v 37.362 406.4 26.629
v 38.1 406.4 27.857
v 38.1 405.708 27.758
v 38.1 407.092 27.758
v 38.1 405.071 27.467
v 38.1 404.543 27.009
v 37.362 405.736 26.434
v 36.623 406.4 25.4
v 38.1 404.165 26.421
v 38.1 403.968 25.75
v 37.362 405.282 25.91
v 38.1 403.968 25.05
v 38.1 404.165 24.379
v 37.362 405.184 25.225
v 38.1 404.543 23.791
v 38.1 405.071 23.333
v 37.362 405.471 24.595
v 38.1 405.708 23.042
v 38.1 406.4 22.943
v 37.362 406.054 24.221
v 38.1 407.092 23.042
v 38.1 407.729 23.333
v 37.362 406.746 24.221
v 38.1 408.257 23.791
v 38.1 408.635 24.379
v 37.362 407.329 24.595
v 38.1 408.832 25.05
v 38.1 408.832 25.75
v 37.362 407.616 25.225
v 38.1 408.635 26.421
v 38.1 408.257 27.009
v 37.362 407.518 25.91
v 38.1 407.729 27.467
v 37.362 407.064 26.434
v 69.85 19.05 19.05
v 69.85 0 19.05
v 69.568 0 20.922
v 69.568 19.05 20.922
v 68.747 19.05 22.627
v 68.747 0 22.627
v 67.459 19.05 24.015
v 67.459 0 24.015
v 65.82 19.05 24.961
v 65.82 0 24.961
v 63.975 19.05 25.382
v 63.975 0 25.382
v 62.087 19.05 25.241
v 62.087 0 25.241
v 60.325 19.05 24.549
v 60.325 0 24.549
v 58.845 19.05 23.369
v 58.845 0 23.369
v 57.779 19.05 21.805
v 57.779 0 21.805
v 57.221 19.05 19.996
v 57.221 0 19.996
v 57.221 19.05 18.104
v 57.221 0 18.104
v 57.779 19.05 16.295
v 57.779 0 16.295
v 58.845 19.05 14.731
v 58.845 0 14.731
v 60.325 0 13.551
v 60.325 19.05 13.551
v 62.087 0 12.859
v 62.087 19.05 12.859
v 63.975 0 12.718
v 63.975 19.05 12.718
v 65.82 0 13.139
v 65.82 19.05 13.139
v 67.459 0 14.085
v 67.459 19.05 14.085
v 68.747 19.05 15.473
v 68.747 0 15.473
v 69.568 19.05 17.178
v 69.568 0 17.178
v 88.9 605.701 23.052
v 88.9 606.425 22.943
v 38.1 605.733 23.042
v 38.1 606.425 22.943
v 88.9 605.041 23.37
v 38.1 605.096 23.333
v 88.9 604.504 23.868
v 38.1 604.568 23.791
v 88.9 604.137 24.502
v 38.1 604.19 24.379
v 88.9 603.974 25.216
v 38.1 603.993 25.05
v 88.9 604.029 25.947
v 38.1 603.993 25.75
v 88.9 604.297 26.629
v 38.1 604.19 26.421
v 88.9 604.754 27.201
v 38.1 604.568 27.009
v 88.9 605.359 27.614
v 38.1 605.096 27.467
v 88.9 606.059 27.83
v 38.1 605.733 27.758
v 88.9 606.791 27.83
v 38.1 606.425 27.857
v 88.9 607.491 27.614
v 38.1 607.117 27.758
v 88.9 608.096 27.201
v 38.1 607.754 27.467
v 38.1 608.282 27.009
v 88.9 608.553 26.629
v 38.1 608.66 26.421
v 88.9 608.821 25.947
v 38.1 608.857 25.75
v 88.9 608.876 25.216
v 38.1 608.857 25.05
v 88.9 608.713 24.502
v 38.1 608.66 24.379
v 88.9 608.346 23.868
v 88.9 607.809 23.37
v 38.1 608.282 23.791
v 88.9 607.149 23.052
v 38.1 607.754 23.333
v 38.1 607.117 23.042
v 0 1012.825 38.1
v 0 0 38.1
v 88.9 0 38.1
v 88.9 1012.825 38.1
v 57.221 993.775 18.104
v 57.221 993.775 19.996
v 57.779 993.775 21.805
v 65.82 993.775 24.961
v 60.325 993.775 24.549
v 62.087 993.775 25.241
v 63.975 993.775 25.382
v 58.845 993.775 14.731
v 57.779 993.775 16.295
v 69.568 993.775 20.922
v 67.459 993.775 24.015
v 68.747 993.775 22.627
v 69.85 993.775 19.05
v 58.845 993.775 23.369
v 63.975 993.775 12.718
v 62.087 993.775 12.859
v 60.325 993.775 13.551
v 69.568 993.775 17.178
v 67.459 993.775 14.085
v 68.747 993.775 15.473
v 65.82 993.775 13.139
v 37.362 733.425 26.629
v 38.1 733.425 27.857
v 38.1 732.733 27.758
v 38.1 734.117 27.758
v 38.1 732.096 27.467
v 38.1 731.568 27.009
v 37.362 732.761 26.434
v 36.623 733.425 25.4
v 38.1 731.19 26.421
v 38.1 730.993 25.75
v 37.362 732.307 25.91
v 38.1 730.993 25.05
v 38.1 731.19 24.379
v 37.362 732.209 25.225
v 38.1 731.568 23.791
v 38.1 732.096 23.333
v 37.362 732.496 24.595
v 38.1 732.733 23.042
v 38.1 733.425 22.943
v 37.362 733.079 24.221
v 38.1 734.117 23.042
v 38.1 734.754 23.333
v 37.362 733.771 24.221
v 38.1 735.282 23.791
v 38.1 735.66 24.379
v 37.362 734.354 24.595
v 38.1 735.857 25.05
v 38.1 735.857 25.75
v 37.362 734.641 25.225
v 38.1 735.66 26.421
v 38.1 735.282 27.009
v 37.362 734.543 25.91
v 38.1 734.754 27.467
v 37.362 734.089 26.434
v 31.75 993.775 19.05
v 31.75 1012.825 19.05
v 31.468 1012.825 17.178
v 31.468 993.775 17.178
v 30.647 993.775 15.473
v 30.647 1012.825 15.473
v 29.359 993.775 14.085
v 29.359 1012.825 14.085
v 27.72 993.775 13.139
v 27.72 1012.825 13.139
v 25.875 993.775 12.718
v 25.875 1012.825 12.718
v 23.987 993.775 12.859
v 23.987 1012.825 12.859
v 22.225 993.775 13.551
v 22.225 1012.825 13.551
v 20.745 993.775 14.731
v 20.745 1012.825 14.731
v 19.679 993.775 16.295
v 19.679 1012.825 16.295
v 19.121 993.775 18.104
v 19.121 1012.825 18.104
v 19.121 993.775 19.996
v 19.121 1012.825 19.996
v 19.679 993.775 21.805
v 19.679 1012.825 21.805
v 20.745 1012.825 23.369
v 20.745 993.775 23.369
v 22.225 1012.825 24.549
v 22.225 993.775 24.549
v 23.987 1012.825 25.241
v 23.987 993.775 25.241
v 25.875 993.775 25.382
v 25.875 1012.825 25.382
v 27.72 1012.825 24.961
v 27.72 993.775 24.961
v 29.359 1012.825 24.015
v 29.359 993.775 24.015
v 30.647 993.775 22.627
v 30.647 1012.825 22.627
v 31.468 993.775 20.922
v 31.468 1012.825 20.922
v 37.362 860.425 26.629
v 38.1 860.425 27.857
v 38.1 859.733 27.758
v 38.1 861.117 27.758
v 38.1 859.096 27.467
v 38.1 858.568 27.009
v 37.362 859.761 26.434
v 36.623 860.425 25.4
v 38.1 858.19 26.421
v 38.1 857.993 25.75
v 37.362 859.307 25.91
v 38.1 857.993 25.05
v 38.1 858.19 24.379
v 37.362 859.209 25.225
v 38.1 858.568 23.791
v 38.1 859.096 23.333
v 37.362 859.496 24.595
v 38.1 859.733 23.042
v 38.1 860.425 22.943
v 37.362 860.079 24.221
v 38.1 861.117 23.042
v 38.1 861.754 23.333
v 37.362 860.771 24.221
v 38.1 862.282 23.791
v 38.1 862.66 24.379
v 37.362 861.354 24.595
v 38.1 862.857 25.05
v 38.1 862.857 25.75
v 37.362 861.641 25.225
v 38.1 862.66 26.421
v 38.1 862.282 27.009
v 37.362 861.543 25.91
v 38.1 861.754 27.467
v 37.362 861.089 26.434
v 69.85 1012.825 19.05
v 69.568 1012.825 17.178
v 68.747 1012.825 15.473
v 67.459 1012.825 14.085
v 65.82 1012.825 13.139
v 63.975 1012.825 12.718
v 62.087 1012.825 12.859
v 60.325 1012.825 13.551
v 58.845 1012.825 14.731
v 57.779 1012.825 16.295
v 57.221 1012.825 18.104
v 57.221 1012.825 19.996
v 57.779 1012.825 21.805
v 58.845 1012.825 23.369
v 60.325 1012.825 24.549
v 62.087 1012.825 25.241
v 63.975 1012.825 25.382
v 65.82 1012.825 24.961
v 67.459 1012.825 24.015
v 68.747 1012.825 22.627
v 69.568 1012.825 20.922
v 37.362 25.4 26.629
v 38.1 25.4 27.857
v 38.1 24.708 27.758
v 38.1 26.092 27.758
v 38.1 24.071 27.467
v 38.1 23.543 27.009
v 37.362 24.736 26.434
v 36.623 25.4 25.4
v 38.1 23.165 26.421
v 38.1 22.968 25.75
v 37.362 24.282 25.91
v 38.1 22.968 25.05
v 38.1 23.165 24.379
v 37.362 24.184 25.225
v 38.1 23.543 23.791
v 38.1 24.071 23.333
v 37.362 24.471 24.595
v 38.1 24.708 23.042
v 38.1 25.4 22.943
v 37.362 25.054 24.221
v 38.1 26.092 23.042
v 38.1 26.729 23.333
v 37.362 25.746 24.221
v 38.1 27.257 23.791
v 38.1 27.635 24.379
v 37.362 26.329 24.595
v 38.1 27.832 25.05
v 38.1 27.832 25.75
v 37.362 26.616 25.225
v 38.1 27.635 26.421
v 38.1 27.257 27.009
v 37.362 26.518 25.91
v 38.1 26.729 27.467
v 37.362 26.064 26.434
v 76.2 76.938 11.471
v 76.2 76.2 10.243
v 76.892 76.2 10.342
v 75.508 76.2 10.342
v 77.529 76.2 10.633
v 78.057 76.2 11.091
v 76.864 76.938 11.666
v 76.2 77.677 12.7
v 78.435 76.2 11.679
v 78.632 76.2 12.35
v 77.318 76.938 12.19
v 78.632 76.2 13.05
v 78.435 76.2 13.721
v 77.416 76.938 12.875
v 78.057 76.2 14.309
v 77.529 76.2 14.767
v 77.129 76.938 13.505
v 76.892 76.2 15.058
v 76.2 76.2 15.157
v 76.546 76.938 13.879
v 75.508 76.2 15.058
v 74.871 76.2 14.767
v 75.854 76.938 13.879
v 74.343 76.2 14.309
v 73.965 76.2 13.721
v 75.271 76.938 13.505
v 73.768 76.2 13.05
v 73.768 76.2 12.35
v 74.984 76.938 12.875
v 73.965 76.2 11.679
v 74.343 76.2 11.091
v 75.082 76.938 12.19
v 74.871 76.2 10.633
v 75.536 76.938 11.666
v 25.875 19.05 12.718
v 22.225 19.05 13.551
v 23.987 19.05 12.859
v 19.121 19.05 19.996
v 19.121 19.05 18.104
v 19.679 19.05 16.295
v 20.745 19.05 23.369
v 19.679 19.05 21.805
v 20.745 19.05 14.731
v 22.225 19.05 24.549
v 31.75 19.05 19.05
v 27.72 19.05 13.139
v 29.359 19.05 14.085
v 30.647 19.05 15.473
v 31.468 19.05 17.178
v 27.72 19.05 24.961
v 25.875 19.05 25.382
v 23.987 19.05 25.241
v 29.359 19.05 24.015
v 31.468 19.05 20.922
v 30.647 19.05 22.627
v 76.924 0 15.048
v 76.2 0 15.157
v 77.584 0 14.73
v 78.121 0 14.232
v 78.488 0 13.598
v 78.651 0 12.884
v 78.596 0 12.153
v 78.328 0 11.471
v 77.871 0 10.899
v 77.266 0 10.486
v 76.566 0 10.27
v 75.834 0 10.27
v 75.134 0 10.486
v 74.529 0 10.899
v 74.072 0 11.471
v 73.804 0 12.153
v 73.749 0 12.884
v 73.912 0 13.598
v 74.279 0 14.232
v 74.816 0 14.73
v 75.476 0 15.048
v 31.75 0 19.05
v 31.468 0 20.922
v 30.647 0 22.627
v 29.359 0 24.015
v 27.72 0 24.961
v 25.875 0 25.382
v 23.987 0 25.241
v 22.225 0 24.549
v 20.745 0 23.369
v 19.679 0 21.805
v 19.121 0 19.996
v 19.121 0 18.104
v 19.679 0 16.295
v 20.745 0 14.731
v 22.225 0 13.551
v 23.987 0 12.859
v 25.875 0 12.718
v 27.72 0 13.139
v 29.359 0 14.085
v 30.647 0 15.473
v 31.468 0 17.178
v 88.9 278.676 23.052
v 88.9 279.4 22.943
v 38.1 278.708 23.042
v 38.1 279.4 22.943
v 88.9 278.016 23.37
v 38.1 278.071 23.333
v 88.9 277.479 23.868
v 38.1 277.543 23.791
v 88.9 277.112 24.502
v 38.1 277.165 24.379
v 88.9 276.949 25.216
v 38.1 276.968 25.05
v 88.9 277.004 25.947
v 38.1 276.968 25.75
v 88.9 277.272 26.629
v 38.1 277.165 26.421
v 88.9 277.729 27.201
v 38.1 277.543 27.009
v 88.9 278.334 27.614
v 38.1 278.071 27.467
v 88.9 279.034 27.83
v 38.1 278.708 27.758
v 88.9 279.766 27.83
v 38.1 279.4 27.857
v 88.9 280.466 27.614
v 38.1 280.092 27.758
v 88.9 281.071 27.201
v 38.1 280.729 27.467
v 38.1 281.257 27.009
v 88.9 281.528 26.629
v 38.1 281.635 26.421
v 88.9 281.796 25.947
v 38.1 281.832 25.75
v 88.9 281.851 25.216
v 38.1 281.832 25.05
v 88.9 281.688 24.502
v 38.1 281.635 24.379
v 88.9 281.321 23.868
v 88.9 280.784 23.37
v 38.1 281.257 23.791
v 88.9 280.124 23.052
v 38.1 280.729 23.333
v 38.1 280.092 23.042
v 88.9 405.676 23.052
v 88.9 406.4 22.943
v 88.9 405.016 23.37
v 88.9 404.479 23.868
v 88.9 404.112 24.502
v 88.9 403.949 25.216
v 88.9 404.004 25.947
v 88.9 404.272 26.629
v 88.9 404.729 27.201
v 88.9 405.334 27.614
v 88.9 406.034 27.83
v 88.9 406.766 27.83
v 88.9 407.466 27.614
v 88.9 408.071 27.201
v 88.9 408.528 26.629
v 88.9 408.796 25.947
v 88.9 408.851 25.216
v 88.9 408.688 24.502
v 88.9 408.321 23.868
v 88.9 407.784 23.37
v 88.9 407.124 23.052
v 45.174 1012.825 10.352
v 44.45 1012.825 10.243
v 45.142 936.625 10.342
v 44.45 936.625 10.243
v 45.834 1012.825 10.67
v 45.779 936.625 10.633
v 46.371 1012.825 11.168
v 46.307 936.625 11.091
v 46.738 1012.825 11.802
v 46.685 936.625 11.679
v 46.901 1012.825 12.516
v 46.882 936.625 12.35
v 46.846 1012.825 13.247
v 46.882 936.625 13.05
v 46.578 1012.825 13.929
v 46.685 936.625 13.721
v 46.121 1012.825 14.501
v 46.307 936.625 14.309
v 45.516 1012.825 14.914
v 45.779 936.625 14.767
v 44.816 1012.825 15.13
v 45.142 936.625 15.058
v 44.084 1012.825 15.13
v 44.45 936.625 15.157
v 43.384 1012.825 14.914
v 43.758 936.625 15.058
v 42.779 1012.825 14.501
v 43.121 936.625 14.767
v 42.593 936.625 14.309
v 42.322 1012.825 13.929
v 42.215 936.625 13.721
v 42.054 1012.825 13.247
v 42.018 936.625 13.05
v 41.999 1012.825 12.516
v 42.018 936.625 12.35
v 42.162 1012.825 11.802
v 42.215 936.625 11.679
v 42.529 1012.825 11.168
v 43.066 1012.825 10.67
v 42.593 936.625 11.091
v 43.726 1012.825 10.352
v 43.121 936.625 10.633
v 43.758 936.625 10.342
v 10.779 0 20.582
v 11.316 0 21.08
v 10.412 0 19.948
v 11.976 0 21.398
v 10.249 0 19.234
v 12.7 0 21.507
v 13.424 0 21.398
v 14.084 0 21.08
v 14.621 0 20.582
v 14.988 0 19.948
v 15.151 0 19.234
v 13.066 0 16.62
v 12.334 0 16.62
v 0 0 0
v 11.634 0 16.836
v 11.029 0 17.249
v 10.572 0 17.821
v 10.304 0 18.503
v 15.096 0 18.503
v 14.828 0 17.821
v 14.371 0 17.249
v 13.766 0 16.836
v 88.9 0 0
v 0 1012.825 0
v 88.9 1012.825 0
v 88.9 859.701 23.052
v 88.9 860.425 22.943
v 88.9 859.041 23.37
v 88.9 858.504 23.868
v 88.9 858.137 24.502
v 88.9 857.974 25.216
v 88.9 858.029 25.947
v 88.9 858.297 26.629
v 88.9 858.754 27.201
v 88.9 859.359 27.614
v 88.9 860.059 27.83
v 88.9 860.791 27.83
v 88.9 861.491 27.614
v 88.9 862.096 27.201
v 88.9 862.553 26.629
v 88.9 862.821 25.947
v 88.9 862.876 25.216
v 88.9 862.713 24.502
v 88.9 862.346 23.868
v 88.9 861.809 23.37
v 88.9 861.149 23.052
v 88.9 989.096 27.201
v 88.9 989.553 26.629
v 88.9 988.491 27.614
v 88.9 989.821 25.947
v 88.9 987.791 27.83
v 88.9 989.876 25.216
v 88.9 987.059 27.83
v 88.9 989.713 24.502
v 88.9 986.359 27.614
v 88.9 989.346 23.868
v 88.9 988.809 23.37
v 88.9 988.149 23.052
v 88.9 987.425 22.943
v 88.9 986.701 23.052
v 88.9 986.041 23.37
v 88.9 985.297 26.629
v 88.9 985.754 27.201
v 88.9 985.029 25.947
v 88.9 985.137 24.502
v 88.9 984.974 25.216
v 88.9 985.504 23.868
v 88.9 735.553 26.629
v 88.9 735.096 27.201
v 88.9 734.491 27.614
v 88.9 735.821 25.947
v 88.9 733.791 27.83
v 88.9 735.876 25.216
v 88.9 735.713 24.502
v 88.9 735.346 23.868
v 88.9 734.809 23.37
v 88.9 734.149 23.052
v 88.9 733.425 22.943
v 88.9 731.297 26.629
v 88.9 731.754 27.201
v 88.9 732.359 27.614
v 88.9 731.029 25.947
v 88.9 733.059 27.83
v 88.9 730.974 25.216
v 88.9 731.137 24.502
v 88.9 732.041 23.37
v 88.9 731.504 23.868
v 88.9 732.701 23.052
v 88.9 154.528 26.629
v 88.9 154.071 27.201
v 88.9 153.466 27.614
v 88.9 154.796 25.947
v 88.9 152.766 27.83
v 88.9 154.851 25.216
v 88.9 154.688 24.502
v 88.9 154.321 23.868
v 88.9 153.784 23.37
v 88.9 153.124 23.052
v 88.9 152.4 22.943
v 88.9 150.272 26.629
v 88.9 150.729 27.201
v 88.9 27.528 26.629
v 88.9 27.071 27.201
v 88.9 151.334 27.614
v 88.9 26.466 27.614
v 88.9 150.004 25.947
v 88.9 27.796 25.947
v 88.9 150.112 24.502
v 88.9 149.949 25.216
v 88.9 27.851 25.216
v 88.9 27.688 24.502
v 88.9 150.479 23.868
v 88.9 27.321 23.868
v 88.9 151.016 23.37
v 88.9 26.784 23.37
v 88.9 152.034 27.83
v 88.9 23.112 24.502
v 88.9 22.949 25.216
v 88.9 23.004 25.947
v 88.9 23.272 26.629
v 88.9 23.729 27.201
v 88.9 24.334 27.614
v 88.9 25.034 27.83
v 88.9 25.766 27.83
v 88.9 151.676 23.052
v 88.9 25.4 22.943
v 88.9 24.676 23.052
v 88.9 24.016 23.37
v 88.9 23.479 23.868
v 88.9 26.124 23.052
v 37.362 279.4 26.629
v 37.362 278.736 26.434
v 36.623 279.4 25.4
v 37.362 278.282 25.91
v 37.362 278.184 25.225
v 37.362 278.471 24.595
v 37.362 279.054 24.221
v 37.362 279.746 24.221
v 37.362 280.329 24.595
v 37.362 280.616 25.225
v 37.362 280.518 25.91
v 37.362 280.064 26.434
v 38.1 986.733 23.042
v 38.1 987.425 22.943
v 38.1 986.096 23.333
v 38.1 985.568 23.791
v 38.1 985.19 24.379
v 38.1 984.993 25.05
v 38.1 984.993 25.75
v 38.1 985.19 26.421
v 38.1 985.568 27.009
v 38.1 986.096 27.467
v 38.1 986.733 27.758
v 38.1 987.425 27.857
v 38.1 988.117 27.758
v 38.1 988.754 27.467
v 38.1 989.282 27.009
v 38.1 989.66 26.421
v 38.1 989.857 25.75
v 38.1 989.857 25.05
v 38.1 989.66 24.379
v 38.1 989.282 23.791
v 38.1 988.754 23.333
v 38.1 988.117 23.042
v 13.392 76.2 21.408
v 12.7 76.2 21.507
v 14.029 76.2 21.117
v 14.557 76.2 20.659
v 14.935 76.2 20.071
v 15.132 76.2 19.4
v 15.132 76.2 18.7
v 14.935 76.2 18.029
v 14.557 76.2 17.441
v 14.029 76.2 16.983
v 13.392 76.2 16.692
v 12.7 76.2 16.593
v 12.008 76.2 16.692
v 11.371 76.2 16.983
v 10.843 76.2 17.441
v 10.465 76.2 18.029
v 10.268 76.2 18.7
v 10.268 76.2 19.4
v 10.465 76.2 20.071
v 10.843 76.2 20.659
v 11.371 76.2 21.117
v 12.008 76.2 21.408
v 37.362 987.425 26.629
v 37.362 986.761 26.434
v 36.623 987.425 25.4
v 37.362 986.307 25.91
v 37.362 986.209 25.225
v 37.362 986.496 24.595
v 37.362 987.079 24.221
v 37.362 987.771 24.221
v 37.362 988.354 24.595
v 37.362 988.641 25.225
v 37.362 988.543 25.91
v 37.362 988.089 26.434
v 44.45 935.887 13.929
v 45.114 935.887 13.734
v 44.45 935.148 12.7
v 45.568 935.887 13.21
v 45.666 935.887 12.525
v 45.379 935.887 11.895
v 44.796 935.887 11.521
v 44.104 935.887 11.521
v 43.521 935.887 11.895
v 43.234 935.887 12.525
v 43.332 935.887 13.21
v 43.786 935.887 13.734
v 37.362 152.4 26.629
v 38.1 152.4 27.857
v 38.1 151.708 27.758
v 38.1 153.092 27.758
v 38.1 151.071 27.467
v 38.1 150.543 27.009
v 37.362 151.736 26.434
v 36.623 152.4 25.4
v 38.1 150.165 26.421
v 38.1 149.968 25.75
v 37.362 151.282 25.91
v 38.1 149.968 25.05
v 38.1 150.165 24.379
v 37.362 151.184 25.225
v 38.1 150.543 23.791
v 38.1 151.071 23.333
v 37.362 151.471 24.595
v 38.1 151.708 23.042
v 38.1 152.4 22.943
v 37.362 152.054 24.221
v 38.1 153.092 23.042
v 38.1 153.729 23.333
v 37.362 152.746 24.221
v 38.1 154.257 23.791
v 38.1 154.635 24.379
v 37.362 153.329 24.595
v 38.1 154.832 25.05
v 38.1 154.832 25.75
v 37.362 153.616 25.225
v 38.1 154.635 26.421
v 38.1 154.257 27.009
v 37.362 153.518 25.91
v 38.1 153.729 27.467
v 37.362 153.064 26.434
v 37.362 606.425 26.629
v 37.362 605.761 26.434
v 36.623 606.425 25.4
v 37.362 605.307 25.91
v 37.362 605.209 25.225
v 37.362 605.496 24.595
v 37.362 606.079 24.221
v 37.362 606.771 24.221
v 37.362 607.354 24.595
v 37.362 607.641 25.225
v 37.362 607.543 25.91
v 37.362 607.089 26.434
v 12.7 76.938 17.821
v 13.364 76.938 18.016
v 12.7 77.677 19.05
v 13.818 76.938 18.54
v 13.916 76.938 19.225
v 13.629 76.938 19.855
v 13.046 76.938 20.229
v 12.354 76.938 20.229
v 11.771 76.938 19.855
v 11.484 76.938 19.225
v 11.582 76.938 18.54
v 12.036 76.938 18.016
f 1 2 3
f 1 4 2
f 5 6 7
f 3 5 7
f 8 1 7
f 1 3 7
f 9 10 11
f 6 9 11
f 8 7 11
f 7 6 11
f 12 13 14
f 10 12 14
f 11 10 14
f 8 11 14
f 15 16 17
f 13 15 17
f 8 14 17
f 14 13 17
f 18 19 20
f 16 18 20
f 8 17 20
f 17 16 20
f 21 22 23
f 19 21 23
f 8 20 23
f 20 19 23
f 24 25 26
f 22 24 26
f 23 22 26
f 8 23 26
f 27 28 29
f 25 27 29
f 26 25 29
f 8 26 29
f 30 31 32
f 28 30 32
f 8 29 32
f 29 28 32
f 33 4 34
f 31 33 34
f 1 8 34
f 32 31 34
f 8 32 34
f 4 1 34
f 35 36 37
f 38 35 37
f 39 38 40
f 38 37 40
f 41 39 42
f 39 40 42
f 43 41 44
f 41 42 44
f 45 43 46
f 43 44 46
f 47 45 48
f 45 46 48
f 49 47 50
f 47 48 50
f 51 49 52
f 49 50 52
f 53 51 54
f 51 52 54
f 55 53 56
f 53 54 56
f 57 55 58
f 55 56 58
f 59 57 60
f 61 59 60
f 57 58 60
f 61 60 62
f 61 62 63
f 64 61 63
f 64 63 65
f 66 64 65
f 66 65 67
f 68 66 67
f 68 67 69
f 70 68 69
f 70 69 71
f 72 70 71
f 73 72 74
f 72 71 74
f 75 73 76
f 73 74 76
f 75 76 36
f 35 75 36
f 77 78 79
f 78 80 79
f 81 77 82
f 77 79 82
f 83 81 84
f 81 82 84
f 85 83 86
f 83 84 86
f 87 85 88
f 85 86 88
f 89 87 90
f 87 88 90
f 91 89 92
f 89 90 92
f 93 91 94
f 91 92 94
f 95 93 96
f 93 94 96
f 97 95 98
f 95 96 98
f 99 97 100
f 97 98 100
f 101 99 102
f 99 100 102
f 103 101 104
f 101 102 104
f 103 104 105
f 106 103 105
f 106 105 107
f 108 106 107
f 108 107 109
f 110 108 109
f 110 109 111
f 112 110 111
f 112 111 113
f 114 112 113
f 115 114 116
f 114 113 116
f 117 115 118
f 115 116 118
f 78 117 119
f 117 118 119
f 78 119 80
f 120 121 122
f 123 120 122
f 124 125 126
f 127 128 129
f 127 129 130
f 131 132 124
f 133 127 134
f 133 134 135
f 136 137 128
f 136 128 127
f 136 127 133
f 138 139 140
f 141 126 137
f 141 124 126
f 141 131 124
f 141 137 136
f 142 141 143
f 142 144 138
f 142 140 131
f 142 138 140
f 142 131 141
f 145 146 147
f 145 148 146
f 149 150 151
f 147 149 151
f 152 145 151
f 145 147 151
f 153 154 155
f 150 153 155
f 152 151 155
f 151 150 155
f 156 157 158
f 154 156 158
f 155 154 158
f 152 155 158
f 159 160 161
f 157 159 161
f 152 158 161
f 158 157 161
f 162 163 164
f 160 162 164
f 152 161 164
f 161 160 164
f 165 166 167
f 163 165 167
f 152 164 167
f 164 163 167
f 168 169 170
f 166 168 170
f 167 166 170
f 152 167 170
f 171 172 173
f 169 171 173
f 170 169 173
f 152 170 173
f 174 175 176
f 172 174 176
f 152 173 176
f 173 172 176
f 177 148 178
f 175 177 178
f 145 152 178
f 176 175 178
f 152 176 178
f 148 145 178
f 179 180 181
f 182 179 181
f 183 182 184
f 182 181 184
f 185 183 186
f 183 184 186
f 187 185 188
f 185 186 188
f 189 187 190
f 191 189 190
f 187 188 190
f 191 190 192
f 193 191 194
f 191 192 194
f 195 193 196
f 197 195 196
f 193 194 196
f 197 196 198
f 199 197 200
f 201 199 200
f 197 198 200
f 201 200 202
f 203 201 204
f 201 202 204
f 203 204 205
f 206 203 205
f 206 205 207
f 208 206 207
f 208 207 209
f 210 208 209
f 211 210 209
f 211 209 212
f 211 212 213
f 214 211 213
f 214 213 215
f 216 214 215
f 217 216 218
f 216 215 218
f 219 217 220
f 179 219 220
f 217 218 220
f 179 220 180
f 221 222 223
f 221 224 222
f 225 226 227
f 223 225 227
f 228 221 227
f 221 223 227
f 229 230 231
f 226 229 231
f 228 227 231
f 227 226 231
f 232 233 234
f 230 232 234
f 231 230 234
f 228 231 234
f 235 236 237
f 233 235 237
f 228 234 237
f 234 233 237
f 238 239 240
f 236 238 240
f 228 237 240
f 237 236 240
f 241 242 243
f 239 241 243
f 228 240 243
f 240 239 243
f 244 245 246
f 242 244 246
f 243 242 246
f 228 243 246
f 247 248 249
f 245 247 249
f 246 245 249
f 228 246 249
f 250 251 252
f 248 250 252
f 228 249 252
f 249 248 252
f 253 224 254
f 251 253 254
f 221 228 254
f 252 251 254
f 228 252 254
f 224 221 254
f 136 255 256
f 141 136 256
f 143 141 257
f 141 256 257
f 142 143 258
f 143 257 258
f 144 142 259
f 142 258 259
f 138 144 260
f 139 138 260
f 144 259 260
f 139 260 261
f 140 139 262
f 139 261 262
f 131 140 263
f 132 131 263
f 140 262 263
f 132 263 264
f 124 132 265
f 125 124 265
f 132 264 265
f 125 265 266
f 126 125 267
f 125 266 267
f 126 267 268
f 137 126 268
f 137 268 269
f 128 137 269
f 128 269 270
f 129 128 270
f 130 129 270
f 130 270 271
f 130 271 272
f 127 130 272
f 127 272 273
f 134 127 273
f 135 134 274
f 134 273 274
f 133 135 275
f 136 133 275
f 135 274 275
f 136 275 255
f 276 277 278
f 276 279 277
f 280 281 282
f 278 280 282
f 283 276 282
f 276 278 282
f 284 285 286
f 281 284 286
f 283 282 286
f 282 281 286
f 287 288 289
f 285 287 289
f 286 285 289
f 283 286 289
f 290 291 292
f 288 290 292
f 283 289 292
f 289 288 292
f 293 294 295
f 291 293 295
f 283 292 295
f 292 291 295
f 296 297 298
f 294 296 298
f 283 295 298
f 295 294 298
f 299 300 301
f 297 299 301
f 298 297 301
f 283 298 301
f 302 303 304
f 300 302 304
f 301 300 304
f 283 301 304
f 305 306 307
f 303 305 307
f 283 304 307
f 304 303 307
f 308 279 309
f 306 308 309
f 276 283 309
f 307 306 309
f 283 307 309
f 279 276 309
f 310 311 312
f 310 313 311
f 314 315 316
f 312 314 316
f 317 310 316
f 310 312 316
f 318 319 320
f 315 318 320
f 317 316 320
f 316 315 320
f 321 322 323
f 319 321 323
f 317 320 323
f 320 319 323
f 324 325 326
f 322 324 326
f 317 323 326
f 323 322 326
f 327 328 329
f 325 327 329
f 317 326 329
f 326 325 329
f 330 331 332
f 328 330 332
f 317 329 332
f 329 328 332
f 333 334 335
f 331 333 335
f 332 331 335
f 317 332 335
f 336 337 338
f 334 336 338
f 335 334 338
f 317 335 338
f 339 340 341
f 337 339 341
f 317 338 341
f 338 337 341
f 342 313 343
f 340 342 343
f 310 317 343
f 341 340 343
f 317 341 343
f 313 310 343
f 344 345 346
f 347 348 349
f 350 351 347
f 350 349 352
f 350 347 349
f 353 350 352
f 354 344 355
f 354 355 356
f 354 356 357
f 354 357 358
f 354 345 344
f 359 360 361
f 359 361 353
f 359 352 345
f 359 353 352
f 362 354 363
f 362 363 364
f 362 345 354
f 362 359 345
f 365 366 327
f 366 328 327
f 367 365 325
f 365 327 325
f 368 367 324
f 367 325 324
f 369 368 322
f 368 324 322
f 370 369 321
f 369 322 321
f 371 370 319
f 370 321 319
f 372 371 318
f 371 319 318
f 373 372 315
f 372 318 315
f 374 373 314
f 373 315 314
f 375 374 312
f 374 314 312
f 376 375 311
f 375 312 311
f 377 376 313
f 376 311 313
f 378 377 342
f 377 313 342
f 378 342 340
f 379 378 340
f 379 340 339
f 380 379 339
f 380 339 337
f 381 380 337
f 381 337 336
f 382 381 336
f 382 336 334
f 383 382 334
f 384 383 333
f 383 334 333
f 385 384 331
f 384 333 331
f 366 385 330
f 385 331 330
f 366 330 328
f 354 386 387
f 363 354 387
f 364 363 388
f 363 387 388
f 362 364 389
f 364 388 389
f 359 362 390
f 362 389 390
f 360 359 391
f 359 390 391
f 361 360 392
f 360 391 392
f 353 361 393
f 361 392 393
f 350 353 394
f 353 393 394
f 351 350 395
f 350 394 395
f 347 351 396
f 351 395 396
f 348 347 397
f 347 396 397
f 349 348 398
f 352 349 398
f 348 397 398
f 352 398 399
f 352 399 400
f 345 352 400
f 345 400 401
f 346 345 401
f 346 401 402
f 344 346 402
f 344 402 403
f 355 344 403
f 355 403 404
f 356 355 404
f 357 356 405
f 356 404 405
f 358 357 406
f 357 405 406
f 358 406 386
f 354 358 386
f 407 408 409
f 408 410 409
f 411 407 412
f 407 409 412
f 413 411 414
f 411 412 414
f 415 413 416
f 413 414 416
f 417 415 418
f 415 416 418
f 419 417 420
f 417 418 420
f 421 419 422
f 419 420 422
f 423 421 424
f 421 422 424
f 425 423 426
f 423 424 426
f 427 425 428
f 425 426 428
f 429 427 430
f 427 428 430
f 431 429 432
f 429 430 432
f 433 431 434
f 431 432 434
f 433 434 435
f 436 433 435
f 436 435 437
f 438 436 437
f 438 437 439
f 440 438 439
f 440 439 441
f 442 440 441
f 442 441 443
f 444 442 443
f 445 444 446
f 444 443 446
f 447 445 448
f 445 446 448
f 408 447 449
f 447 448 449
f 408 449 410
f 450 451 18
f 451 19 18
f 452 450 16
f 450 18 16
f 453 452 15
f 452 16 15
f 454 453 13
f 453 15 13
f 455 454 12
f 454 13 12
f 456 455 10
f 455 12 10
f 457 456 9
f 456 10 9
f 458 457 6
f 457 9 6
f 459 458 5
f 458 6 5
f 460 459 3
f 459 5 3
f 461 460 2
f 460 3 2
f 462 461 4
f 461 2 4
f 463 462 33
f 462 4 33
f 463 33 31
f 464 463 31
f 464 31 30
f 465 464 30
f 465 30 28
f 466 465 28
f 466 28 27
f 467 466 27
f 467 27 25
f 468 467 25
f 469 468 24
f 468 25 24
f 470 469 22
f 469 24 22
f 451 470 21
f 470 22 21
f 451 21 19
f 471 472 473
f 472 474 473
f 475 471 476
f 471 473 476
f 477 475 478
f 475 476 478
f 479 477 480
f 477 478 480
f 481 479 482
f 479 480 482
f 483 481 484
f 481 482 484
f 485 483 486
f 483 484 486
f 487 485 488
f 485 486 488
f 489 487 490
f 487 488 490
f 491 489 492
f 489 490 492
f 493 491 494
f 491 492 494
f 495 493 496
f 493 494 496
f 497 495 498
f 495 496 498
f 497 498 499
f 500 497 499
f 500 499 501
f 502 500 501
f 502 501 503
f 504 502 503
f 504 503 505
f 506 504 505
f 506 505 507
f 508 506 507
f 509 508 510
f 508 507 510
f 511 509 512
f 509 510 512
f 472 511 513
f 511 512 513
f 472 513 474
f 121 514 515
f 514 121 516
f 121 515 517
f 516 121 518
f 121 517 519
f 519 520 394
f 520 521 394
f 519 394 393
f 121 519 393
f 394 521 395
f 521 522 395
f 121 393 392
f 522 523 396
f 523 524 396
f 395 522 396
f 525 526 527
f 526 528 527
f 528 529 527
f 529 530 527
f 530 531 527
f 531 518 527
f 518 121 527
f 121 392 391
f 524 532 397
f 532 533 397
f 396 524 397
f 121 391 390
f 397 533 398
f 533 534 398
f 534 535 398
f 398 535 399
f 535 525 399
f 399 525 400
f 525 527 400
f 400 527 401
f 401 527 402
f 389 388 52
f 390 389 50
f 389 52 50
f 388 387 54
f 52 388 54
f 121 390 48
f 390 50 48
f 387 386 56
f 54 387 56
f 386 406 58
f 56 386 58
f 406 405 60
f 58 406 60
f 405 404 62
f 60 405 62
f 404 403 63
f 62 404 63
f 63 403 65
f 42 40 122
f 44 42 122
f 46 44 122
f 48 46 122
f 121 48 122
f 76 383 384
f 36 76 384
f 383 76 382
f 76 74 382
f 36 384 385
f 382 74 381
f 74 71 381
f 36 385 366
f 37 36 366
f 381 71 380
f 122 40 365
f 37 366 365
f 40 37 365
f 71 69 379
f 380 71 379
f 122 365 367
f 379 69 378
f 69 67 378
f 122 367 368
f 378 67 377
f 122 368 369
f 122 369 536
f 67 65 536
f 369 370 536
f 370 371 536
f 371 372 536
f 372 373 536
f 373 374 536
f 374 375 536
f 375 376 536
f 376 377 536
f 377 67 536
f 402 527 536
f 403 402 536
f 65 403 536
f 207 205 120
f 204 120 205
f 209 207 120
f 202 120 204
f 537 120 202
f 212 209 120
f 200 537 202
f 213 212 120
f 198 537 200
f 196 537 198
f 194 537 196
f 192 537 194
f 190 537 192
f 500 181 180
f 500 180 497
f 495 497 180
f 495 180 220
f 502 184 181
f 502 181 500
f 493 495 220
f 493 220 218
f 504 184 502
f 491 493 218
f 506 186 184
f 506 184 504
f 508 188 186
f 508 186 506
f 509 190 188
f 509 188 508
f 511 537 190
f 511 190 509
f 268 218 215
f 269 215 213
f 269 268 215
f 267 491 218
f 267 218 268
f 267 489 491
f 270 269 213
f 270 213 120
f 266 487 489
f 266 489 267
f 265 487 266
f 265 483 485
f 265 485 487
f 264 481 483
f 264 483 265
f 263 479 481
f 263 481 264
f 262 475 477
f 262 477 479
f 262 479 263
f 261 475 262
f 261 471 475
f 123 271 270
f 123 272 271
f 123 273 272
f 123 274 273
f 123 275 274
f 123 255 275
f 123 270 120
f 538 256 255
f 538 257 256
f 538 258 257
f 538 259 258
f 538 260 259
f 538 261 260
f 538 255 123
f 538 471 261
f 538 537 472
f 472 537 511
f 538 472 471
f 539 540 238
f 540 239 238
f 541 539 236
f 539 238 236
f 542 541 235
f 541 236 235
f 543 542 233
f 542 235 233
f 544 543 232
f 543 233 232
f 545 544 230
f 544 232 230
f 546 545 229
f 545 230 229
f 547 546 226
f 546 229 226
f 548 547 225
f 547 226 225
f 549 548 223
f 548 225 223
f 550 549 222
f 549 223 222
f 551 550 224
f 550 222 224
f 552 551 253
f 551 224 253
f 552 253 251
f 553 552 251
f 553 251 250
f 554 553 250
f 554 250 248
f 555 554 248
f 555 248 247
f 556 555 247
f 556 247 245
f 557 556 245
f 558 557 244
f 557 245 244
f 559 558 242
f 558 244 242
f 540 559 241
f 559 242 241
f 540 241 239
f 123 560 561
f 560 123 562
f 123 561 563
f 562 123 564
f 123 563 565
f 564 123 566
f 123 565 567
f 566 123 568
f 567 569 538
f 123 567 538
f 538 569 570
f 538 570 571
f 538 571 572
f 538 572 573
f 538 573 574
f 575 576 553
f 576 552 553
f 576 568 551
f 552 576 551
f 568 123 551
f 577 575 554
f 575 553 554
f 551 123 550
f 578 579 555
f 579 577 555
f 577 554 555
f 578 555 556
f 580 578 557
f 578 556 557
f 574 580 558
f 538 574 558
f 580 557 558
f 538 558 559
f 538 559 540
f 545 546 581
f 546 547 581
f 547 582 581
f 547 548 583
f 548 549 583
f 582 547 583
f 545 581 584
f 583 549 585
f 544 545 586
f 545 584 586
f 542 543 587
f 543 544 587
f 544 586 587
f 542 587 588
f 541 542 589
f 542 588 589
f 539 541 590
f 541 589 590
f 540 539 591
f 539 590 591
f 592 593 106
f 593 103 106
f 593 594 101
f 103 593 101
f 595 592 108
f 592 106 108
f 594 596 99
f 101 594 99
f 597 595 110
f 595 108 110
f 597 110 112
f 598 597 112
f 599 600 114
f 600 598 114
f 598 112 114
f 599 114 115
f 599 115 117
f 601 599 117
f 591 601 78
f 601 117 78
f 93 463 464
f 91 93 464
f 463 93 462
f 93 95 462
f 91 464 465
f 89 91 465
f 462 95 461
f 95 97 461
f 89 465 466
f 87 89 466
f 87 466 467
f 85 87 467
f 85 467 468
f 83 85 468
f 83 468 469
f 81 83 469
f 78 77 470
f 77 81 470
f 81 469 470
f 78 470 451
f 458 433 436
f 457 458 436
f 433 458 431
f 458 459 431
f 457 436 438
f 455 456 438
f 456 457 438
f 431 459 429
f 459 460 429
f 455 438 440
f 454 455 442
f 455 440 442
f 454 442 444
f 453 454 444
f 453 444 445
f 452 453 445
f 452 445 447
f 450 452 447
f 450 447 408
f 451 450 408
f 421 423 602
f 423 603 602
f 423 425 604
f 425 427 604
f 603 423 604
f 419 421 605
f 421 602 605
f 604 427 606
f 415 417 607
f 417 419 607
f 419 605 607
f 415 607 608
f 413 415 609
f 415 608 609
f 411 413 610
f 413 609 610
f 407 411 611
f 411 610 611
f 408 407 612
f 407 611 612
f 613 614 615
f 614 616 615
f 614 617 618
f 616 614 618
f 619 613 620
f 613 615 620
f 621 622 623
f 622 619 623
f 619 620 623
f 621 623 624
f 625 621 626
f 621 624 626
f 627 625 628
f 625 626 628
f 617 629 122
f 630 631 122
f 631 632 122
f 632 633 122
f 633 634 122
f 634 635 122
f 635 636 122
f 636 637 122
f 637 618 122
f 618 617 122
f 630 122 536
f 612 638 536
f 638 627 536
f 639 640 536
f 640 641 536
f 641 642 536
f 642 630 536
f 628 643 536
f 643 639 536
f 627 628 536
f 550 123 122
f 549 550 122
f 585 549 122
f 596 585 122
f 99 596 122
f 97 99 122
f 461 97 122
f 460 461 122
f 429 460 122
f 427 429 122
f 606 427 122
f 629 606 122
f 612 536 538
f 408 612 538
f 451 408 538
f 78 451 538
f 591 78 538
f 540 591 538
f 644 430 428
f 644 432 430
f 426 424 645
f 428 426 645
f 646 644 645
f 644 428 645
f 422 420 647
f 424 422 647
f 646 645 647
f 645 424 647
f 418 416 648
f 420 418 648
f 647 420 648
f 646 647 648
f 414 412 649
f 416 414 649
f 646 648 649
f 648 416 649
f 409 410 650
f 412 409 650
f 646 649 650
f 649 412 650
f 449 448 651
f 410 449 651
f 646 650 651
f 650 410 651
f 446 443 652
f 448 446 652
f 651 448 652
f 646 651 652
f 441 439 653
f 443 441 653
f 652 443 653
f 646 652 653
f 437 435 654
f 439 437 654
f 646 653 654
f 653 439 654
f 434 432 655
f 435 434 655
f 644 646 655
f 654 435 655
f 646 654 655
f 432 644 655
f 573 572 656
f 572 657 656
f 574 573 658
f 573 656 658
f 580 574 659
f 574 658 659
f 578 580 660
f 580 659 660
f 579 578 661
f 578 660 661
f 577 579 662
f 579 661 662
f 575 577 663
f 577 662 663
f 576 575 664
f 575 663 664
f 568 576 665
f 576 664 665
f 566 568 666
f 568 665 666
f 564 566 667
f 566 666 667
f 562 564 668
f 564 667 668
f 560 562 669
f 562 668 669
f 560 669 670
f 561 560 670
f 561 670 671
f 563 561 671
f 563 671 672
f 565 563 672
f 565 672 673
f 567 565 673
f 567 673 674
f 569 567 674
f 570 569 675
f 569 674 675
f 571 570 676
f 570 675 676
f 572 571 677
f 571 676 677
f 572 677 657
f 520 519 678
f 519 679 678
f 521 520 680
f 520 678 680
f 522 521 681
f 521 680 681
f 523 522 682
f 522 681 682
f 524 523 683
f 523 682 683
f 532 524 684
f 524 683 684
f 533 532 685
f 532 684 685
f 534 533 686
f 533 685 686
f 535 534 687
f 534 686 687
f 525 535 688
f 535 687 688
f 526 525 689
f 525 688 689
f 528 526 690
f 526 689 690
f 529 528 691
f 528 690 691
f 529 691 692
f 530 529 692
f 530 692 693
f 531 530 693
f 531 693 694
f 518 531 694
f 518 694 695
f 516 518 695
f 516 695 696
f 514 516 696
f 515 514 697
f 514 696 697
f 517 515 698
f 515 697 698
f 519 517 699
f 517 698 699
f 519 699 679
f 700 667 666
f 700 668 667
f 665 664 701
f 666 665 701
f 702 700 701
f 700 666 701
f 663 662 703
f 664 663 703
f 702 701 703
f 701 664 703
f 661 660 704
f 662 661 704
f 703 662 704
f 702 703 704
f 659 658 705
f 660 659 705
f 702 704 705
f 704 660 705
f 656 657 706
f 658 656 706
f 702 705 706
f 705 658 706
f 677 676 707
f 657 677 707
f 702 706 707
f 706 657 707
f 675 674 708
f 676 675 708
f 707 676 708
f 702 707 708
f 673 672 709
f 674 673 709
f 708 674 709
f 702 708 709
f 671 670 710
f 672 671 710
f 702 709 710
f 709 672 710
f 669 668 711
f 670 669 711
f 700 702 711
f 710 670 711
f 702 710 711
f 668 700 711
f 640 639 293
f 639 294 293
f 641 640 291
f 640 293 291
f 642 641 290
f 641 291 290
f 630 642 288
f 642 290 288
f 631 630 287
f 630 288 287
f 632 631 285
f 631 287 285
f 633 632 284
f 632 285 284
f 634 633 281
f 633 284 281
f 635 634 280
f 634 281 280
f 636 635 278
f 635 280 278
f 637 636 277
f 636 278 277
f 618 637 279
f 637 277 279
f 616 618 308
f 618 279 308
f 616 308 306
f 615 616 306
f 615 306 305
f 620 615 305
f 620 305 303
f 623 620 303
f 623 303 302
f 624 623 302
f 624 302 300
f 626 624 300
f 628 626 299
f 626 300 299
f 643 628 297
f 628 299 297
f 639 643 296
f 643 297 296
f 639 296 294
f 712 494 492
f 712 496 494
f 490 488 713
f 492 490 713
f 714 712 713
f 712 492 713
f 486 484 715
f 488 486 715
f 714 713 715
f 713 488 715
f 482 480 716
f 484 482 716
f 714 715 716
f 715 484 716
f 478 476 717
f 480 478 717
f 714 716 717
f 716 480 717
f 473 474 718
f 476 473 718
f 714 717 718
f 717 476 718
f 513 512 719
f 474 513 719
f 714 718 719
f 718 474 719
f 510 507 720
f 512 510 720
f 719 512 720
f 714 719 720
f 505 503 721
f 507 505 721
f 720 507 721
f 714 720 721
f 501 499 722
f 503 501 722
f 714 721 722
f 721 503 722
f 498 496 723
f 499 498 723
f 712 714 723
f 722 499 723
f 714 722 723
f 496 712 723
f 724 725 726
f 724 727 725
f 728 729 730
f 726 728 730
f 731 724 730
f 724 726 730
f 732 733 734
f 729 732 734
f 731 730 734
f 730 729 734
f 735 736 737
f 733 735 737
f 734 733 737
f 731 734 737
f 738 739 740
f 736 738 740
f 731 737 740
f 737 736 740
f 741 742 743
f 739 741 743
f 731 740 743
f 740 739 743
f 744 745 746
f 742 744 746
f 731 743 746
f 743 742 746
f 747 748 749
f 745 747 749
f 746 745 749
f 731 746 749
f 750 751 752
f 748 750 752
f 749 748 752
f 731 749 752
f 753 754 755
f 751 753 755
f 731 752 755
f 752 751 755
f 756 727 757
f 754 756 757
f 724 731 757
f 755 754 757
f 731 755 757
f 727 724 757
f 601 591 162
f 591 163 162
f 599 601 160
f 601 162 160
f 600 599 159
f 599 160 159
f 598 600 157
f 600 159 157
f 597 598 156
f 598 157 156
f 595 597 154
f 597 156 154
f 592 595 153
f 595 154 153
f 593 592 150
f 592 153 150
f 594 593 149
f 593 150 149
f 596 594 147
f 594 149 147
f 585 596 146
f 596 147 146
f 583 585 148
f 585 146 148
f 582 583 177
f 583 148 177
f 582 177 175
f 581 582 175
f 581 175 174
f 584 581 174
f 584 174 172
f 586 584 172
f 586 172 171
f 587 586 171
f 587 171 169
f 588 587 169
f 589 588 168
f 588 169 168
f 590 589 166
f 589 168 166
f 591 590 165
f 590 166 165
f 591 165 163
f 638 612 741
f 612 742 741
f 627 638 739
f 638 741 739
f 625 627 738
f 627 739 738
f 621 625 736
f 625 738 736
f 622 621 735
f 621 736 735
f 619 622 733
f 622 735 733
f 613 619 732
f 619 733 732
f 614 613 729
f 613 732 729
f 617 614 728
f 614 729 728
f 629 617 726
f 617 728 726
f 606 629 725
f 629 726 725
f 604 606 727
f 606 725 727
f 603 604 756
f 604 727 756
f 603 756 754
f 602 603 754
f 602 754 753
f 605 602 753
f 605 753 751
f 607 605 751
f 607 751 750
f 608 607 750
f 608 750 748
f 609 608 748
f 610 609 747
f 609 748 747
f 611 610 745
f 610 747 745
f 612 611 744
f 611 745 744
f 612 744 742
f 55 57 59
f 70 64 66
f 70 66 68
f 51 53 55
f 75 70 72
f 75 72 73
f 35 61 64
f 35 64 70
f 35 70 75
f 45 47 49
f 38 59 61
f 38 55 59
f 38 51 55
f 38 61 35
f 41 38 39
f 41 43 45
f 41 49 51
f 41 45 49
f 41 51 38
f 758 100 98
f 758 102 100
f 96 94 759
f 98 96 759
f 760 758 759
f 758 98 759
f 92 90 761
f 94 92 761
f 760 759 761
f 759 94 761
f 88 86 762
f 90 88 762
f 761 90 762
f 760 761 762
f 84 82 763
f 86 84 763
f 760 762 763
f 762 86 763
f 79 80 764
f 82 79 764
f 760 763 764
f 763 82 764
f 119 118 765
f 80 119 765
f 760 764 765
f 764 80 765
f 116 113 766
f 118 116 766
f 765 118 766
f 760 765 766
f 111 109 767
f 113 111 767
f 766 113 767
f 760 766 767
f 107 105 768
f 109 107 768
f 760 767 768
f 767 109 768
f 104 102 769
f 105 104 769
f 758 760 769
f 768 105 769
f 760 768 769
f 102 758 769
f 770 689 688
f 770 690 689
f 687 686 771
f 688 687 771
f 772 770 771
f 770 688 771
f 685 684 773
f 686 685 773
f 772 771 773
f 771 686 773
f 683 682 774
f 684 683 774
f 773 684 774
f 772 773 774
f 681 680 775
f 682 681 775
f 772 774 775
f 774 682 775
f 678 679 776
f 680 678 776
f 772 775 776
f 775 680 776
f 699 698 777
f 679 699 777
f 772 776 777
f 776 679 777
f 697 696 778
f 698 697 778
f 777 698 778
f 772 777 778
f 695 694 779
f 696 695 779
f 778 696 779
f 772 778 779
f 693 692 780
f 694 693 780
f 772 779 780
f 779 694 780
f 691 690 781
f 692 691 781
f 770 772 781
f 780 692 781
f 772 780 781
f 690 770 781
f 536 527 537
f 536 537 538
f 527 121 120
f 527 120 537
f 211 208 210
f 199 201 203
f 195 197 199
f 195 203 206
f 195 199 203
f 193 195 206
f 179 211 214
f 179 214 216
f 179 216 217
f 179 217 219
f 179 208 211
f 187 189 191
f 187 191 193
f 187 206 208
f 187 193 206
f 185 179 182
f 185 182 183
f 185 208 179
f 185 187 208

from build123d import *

# Parameters (mm, degrees)
SKETCH1_W                                  = 88.9
SKETCH1_H                                  = 38.1
BOSS_EXTRUDE1_DEPTH                        = 1012.825
SKETCH2_R                                  = 6.35
CUT_EXTRUDE1_DEPTH                         = 19.05
SKETCH3_R                                  = 6.35
CUT_EXTRUDE2_DEPTH                         = 19.05
F_10_0_1935_DIAMETER_HOLE1_D               = 4.9149
F_10_0_1935_DIAMETER_HOLE1_DEPTH           = 76.2
F_10_0_1935_DIAMETER_HOLE1_TIP             = 1.476584928
F_10_0_1935_DIAMETER_HOLE1_ON_FACE_2_D     = 4.9149
F_10_0_1935_DIAMETER_HOLE1_ON_FACE_2_DEPTH = 76.2
F_10_0_1935_DIAMETER_HOLE1_ON_FACE_2_TIP   = 1.476584928
F_10_0_1935_DIAMETER_HOLE2_D               = 4.9149
F_10_0_1935_DIAMETER_HOLE2_DEPTH           = 50.8
F_10_0_1935_DIAMETER_HOLE2_TIP             = 1.476584928


with BuildPart() as part:
    # Sketch1 → Boss-Extrude1 (new body)
    with BuildSketch(Plane(origin=(0, 0, 0), x_dir=(1, 0, 0), z_dir=(0, 1, 0))):
        with Locations((44.45, -19.05)):
            Rectangle(SKETCH1_W, SKETCH1_H)
    extrude(amount=BOSS_EXTRUDE1_DEPTH)

    # Sketch2 → Cut-Extrude1 (cut)
    with BuildSketch(Plane(origin=(0, 1012.825, 0), x_dir=(1, 0, 0), z_dir=(0, 1, 0))):
        with Locations((25.4, -19.05)):
            Circle(SKETCH2_R)
        with Locations((63.5, -19.05)):
            Circle(SKETCH2_R)
    extrude(amount=-CUT_EXTRUDE1_DEPTH, mode=Mode.SUBTRACT)

    # Sketch3 → Cut-Extrude2 (cut)
    with BuildSketch(Plane.XZ):
        with Locations((25.4, 19.05)):
            Circle(SKETCH3_R)
        with Locations((63.5, 19.05)):
            Circle(SKETCH3_R)
    extrude(amount=-CUT_EXTRUDE2_DEPTH, mode=Mode.SUBTRACT)

    # #10 (0.1935) Diameter Hole1
    with Locations(Plane(origin=(44.45, 1012.825, 12.7), x_dir=(0, 0, 1), z_dir=(0, 1, 0))):
        with Locations((0, 0)):
            Hole(F_10_0_1935_DIAMETER_HOLE1_D / 2, depth=F_10_0_1935_DIAMETER_HOLE1_DEPTH)
            with Locations((0, 0, -(F_10_0_1935_DIAMETER_HOLE1_DEPTH + F_10_0_1935_DIAMETER_HOLE1_TIP / 2))):  # 118° drill point
                Cone(0, F_10_0_1935_DIAMETER_HOLE1_D / 2, F_10_0_1935_DIAMETER_HOLE1_TIP, mode=Mode.SUBTRACT)

    # #10 (0.1935) Diameter Hole1 on face 2
    with Locations(Plane(origin=(12.7, 0, 19.05), x_dir=(0, 0, -1), z_dir=(0, -1, 0))):
        with Locations((0, 0), (6.35, 63.5)):
            Hole(F_10_0_1935_DIAMETER_HOLE1_ON_FACE_2_D / 2, depth=F_10_0_1935_DIAMETER_HOLE1_ON_FACE_2_DEPTH)
            with Locations((0, 0, -(F_10_0_1935_DIAMETER_HOLE1_ON_FACE_2_DEPTH + F_10_0_1935_DIAMETER_HOLE1_ON_FACE_2_TIP / 2))):  # 118° drill point
                Cone(0, F_10_0_1935_DIAMETER_HOLE1_ON_FACE_2_D / 2, F_10_0_1935_DIAMETER_HOLE1_ON_FACE_2_TIP, mode=Mode.SUBTRACT)

    # #10 (0.1935) Diameter Hole2
    with Locations(Plane(origin=(88.9, 987.425, 25.4), x_dir=(0, 0, 1), z_dir=(1, 0, 0))):
        with Locations((0, 0), (0, 127), (0, 254), (0, 381), (0, 581.025), (0, 708.025), (0, 835.025), (0, 962.025)):
            Hole(F_10_0_1935_DIAMETER_HOLE2_D / 2, depth=F_10_0_1935_DIAMETER_HOLE2_DEPTH)
            with Locations((0, 0, -(F_10_0_1935_DIAMETER_HOLE2_DEPTH + F_10_0_1935_DIAMETER_HOLE2_TIP / 2))):  # 118° drill point
                Cone(0, F_10_0_1935_DIAMETER_HOLE2_D / 2, F_10_0_1935_DIAMETER_HOLE2_TIP, mode=Mode.SUBTRACT)


solid = part.part
